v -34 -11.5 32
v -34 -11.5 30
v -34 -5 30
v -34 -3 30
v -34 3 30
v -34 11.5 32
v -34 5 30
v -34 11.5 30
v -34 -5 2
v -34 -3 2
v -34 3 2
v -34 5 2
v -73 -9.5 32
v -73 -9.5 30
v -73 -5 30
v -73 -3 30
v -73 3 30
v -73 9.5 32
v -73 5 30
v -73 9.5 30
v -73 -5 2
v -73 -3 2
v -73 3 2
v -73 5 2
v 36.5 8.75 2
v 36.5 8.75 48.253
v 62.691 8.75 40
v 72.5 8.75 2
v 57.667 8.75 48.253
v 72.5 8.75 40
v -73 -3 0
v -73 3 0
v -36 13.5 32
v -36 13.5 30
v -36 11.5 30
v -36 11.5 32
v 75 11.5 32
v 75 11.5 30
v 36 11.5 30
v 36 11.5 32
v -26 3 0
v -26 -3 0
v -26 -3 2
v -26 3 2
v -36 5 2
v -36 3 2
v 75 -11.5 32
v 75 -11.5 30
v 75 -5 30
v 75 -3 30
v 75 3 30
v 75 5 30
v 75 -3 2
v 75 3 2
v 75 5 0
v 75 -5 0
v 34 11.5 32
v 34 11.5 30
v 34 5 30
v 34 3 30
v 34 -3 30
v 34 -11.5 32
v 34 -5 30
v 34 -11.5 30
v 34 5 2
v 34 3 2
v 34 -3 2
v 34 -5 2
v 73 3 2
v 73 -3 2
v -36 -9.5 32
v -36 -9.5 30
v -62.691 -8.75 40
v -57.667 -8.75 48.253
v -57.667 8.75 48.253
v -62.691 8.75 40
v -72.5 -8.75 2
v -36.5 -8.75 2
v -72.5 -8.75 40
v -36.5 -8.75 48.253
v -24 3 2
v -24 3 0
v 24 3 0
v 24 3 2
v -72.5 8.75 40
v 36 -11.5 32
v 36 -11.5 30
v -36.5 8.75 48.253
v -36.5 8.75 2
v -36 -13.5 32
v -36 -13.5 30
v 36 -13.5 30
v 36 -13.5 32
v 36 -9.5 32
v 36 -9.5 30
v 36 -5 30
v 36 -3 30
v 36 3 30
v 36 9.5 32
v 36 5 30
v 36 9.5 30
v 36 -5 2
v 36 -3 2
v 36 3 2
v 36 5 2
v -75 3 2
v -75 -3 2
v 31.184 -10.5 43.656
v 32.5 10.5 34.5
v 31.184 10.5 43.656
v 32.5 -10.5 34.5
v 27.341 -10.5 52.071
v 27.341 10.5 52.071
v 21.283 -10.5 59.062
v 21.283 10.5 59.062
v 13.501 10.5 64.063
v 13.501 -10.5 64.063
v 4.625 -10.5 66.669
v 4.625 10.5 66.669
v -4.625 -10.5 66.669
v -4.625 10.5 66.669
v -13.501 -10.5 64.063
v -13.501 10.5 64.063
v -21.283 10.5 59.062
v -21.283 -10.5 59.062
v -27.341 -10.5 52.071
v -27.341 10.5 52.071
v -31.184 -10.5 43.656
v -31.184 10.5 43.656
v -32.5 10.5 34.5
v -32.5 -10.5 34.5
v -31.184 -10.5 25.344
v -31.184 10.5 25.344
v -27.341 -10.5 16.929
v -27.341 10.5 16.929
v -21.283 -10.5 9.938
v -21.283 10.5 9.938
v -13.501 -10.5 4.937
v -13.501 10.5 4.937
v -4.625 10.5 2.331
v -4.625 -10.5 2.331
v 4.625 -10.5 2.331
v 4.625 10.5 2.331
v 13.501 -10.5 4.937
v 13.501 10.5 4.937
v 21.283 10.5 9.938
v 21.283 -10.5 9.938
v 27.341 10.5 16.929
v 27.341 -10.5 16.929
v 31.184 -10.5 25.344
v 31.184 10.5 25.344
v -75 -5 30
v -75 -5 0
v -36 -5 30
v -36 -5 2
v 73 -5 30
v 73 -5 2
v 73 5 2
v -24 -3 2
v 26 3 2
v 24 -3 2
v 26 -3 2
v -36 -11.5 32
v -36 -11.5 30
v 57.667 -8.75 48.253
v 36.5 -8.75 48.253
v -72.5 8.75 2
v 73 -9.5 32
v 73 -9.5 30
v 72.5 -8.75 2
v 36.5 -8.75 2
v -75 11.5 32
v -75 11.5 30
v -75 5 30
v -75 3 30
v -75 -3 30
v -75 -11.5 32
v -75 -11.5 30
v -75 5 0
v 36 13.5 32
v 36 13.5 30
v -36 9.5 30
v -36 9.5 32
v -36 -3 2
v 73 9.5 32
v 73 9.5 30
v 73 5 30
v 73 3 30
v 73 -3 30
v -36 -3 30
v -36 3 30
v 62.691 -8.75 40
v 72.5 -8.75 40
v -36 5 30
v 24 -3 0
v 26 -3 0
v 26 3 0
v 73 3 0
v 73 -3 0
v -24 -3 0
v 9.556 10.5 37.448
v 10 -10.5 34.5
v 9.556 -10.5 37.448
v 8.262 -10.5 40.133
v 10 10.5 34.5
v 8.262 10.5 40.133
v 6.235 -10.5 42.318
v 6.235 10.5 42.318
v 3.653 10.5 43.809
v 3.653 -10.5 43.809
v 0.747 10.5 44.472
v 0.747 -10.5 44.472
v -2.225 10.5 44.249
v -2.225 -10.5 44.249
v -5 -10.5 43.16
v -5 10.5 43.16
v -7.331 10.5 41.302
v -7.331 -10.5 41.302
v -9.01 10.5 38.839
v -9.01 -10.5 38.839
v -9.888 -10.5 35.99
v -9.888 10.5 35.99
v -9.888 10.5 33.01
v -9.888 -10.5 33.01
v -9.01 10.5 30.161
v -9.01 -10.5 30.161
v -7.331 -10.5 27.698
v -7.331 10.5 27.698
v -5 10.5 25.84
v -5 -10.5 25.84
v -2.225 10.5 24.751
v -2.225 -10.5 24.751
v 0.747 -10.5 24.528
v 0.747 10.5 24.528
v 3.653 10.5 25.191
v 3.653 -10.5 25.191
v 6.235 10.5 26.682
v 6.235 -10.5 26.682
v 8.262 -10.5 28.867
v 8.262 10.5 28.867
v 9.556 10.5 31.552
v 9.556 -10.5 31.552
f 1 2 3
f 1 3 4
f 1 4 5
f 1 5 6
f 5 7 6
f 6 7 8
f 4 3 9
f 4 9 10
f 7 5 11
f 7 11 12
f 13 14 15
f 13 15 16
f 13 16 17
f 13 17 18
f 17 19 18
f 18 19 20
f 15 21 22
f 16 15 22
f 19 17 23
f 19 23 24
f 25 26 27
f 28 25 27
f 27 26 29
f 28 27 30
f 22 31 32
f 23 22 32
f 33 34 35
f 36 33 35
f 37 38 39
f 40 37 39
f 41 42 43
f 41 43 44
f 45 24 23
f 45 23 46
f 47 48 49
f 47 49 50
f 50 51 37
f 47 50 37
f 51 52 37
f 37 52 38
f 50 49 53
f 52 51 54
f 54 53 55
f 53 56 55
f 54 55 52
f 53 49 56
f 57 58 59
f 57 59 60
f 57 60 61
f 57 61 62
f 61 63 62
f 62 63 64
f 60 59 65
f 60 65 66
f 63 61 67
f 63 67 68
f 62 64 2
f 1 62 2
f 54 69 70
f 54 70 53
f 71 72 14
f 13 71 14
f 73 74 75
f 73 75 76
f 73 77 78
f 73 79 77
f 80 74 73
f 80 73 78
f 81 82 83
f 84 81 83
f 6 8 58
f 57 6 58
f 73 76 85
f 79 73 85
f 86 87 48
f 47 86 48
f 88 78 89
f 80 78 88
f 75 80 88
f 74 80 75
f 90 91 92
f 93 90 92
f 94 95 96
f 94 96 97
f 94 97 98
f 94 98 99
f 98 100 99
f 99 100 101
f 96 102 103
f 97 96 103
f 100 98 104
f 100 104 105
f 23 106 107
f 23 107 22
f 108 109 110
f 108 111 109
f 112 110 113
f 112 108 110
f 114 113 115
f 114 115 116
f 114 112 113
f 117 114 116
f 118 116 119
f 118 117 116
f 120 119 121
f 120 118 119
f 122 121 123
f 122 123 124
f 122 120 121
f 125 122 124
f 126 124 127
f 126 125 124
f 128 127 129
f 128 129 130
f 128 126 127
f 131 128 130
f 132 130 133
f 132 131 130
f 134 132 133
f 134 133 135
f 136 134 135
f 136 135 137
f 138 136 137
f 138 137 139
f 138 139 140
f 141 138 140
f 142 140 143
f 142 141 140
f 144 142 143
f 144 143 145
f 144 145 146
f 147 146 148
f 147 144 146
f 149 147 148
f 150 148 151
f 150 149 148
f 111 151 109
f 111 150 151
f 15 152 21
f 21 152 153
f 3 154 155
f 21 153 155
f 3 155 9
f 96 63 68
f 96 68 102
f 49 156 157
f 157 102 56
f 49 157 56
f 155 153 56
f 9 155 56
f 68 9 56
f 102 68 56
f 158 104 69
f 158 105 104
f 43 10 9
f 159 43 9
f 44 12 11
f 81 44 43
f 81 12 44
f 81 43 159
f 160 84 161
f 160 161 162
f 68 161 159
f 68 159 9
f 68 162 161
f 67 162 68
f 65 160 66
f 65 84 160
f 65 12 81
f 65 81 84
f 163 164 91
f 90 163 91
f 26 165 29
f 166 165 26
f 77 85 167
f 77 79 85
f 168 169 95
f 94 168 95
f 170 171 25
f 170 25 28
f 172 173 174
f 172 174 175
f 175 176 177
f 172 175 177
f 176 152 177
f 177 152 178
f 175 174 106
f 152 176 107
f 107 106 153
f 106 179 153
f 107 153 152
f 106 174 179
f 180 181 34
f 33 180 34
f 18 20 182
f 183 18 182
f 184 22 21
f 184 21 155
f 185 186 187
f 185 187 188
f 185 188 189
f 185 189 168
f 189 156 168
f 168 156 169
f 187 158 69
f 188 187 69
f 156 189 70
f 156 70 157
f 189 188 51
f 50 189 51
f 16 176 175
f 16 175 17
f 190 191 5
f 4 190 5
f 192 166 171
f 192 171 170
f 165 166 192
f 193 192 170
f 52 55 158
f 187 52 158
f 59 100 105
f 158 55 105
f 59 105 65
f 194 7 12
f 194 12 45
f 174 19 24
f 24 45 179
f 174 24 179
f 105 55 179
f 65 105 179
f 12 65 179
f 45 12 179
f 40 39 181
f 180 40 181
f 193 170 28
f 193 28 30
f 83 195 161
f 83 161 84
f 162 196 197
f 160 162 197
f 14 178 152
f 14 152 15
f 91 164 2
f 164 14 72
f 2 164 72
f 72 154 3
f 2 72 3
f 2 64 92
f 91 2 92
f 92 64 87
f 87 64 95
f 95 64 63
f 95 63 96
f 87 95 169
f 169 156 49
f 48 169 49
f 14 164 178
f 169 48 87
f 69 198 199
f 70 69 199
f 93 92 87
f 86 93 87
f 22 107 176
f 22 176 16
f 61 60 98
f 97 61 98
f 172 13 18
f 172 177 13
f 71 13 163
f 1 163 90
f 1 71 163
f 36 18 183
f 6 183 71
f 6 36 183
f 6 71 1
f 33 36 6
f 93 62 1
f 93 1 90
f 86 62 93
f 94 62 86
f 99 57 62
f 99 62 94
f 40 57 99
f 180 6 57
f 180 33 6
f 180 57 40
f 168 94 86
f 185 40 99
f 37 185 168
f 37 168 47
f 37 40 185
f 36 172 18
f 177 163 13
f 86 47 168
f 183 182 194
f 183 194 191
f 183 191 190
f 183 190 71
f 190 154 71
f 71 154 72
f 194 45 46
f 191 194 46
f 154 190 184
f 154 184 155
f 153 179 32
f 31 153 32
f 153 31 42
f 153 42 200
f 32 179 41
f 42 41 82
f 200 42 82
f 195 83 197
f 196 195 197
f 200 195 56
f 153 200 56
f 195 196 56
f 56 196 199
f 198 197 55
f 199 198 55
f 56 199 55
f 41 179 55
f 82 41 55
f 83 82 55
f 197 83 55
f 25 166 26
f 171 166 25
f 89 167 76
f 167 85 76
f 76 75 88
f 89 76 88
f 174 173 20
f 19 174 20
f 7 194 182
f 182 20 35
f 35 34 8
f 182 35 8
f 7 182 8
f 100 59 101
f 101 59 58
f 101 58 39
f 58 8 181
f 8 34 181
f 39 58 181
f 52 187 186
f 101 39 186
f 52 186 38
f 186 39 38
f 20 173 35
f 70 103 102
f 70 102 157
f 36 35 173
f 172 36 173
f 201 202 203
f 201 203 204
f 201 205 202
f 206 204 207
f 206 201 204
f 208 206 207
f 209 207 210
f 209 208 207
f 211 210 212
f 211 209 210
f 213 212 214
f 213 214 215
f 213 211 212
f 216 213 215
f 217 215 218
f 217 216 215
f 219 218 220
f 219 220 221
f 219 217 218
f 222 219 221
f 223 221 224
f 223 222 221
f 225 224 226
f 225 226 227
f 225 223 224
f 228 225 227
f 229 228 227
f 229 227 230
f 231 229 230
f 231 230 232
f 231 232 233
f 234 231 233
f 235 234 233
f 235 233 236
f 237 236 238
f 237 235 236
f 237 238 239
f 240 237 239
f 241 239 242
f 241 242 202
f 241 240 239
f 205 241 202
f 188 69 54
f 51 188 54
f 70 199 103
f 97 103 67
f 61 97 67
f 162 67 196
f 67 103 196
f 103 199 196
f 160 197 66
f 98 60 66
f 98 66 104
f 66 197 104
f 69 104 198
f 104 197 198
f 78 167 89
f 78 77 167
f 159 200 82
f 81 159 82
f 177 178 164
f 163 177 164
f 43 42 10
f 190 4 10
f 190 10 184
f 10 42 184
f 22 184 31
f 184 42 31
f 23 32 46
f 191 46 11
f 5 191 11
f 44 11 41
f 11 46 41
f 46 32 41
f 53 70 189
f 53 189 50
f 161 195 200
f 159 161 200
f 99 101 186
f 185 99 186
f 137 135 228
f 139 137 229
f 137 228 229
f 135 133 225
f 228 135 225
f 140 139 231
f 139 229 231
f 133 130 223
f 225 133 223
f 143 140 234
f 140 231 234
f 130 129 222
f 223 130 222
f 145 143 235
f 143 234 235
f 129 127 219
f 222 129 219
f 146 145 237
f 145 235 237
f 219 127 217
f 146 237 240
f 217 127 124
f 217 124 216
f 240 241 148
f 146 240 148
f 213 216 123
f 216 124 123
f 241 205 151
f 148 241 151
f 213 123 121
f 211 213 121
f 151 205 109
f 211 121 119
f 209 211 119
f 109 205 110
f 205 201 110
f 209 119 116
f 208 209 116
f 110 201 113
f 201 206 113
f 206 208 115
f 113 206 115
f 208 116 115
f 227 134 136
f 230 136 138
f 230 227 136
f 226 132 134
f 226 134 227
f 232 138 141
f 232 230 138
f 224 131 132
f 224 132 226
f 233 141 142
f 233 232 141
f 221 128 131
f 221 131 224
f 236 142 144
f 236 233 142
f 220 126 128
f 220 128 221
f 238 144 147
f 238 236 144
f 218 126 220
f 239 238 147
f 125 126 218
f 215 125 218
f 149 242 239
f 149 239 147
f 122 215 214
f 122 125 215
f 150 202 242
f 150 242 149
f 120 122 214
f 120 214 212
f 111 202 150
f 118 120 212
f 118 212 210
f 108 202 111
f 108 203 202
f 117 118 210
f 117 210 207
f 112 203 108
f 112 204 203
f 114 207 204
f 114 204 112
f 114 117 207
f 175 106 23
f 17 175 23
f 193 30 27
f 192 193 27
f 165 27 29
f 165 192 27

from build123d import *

# Parameters (mm, degrees)
F0_W     = 37
F0_H     = 2
F0_W_2   = 2
F0_H_2   = 6
F1_DEPTH = 2
F2_DEPTH = 30
F3_START = 30
F3_DEPTH = 2
F5_DEPTH = 8.75
F4_R     = 32.5
F4_R_2   = 10
F6_DEPTH = 10.5


with BuildPart() as f1:
    # F0 (on Top) → F1 (new body)
    with BuildSketch(Plane.XY):
        with Locations((-54.5, 4)):
            Rectangle(F0_W, F0_H)
        Polygon((-75, -3), (-73, -3), (-73, 0), (-73, 3), (-75, 3), (-75, 0), align=None)
        with Locations((-74, 4)):
            Rectangle(F0_W_2, F0_H)
        with Locations((-74, -4)):
            Rectangle(F0_W_2, F0_H)
        with Locations((-54.5, -4)):
            Rectangle(F0_W, F0_H)
        with Locations((-35, -4)):
            Rectangle(F0_W_2, F0_H)
        with Locations((-35, 4)):
            Rectangle(F0_W_2, F0_H)
        Polygon((26, 3), (34, 3), (34, 5), (-34, 5), (-34, 3), (-26, 3), (-24, 3), (24, 3), align=None)
        with Locations((-25, 0)):
            Rectangle(F0_W_2, F0_H_2)
        Polygon((-34, -5), (34, -5), (34, -3), (26, -3), (24, -3), (-24, -3), (-26, -3), (-34, -3), align=None)
        with Locations((25, 0)):
            Rectangle(F0_W_2, F0_H_2)
        with Locations((35, 4)):
            Rectangle(F0_W_2, F0_H)
        with Locations((35, -4)):
            Rectangle(F0_W_2, F0_H)
        with Locations((54.5, 4)):
            Rectangle(F0_W, F0_H)
        with Locations((54.5, -4)):
            Rectangle(F0_W, F0_H)
        with Locations((74, 4)):
            Rectangle(F0_W_2, F0_H)
        Polygon((73, -3), (75, -3), (75, 0), (75, 3), (73, 3), (73, 0), align=None)
        with Locations((74, -4)):
            Rectangle(F0_W_2, F0_H)
    extrude(amount=F1_DEPTH)

    # F0 (on Top) → F2 (join)
    with BuildSketch(Plane.XY):
        with Locations((-74, 4)):
            Rectangle(F0_W_2, F0_H)
        with Locations((-74, -4)):
            Rectangle(F0_W_2, F0_H)
        with Locations((-35, 4)):
            Rectangle(F0_W_2, F0_H)
        with Locations((-35, -4)):
            Rectangle(F0_W_2, F0_H)
        with Locations((35, 4)):
            Rectangle(F0_W_2, F0_H)
        with Locations((35, -4)):
            Rectangle(F0_W_2, F0_H)
        with Locations((74, 4)):
            Rectangle(F0_W_2, F0_H)
        with Locations((74, -4)):
            Rectangle(F0_W_2, F0_H)
    extrude(amount=F2_DEPTH)

    # F0 (on Top) → F3 (join)
    with BuildSketch(Plane.XY.offset(F3_START)):
        Polygon((73, 5), (75, 5), (75, 11.5), (36, 11.5), (36, 9.5), (73, 9.5), align=None)
        with Locations((74, 4)):
            Rectangle(F0_W_2, F0_H)
        Polygon((73, -3), (75, -3), (75, 0), (75, 3), (73, 3), (73, 0), align=None)
        with Locations((74, -4)):
            Rectangle(F0_W_2, F0_H)
        Polygon((75, -11.5), (75, -5), (73, -5), (73, -9.5), (36, -9.5), (36, -11.5), align=None)
        Polygon((34, 5), (36, 5), (36, 9.5), (36, 11.5), (36, 13.5), (-36, 13.5), (-36, 11.5), (-36, 9.5), (-36, 5), (-34, 5), (-34, 11.5), (34, 11.5), align=None)
        with Locations((35, 4)):
            Rectangle(F0_W_2, F0_H)
        with Locations((35, 0)):
            Rectangle(F0_W_2, F0_H_2)
        with Locations((35, -4)):
            Rectangle(F0_W_2, F0_H)
        Polygon((36, -9.5), (36, -5), (34, -5), (34, -11.5), (-34, -11.5), (-34, -5), (-36, -5), (-36, -9.5), (-36, -11.5), (-36, -13.5), (36, -13.5), (36, -11.5), align=None)
        with Locations((-35, 4)):
            Rectangle(F0_W_2, F0_H)
        with Locations((-35, 0)):
            Rectangle(F0_W_2, F0_H_2)
        with Locations((-35, -4)):
            Rectangle(F0_W_2, F0_H)
        Polygon((-75, 5), (-73, 5), (-73, 9.5), (-36, 9.5), (-36, 11.5), (-75, 11.5), align=None)
        Polygon((-75, -11.5), (-36, -11.5), (-36, -9.5), (-73, -9.5), (-73, -5), (-75, -5), align=None)
        with Locations((-74, -4)):
            Rectangle(F0_W_2, F0_H)
        Polygon((-75, -3), (-73, -3), (-73, 0), (-73, 3), (-75, 3), (-75, 0), align=None)
        with Locations((-74, 4)):
            Rectangle(F0_W_2, F0_H)
    extrude(amount=F3_DEPTH)


with BuildPart() as f5:
    # F4 (on Front) → F5 (new body, symmetric)
    with BuildSketch(Plane.XZ):
        Polygon((-72.5, 2), (-36.5, 2), (-36.5, 48.2532925308), (-57.6668344438, 48.2532925308), (-62.6910105348, 40), (-72.5, 40), align=None)
    extrude(amount=F5_DEPTH, both=True)


with BuildPart() as f5b:
    # F4 (on Front) → F5, piece 2 (new body, symmetric)
    with BuildSketch(Plane.XZ):
        Polygon((36.5, 48.2532925308), (36.5, 2), (72.5, 2), (72.5, 40), (62.6910105348, 40), (57.6668344438, 48.2532925308), align=None)
    extrude(amount=F5_DEPTH, both=True)


with BuildPart() as f6:
    # F4 (on Front) → F6 (new body, symmetric)
    with BuildSketch(Plane.XZ):
        with Locations((0, 34.5)):
            Circle(F4_R)
        with Locations((0, 34.5)):
            Circle(F4_R_2, mode=Mode.SUBTRACT)
    extrude(amount=F6_DEPTH, both=True)


solid = Compound([f1.part, f5.part, f5b.part, f6.part])
